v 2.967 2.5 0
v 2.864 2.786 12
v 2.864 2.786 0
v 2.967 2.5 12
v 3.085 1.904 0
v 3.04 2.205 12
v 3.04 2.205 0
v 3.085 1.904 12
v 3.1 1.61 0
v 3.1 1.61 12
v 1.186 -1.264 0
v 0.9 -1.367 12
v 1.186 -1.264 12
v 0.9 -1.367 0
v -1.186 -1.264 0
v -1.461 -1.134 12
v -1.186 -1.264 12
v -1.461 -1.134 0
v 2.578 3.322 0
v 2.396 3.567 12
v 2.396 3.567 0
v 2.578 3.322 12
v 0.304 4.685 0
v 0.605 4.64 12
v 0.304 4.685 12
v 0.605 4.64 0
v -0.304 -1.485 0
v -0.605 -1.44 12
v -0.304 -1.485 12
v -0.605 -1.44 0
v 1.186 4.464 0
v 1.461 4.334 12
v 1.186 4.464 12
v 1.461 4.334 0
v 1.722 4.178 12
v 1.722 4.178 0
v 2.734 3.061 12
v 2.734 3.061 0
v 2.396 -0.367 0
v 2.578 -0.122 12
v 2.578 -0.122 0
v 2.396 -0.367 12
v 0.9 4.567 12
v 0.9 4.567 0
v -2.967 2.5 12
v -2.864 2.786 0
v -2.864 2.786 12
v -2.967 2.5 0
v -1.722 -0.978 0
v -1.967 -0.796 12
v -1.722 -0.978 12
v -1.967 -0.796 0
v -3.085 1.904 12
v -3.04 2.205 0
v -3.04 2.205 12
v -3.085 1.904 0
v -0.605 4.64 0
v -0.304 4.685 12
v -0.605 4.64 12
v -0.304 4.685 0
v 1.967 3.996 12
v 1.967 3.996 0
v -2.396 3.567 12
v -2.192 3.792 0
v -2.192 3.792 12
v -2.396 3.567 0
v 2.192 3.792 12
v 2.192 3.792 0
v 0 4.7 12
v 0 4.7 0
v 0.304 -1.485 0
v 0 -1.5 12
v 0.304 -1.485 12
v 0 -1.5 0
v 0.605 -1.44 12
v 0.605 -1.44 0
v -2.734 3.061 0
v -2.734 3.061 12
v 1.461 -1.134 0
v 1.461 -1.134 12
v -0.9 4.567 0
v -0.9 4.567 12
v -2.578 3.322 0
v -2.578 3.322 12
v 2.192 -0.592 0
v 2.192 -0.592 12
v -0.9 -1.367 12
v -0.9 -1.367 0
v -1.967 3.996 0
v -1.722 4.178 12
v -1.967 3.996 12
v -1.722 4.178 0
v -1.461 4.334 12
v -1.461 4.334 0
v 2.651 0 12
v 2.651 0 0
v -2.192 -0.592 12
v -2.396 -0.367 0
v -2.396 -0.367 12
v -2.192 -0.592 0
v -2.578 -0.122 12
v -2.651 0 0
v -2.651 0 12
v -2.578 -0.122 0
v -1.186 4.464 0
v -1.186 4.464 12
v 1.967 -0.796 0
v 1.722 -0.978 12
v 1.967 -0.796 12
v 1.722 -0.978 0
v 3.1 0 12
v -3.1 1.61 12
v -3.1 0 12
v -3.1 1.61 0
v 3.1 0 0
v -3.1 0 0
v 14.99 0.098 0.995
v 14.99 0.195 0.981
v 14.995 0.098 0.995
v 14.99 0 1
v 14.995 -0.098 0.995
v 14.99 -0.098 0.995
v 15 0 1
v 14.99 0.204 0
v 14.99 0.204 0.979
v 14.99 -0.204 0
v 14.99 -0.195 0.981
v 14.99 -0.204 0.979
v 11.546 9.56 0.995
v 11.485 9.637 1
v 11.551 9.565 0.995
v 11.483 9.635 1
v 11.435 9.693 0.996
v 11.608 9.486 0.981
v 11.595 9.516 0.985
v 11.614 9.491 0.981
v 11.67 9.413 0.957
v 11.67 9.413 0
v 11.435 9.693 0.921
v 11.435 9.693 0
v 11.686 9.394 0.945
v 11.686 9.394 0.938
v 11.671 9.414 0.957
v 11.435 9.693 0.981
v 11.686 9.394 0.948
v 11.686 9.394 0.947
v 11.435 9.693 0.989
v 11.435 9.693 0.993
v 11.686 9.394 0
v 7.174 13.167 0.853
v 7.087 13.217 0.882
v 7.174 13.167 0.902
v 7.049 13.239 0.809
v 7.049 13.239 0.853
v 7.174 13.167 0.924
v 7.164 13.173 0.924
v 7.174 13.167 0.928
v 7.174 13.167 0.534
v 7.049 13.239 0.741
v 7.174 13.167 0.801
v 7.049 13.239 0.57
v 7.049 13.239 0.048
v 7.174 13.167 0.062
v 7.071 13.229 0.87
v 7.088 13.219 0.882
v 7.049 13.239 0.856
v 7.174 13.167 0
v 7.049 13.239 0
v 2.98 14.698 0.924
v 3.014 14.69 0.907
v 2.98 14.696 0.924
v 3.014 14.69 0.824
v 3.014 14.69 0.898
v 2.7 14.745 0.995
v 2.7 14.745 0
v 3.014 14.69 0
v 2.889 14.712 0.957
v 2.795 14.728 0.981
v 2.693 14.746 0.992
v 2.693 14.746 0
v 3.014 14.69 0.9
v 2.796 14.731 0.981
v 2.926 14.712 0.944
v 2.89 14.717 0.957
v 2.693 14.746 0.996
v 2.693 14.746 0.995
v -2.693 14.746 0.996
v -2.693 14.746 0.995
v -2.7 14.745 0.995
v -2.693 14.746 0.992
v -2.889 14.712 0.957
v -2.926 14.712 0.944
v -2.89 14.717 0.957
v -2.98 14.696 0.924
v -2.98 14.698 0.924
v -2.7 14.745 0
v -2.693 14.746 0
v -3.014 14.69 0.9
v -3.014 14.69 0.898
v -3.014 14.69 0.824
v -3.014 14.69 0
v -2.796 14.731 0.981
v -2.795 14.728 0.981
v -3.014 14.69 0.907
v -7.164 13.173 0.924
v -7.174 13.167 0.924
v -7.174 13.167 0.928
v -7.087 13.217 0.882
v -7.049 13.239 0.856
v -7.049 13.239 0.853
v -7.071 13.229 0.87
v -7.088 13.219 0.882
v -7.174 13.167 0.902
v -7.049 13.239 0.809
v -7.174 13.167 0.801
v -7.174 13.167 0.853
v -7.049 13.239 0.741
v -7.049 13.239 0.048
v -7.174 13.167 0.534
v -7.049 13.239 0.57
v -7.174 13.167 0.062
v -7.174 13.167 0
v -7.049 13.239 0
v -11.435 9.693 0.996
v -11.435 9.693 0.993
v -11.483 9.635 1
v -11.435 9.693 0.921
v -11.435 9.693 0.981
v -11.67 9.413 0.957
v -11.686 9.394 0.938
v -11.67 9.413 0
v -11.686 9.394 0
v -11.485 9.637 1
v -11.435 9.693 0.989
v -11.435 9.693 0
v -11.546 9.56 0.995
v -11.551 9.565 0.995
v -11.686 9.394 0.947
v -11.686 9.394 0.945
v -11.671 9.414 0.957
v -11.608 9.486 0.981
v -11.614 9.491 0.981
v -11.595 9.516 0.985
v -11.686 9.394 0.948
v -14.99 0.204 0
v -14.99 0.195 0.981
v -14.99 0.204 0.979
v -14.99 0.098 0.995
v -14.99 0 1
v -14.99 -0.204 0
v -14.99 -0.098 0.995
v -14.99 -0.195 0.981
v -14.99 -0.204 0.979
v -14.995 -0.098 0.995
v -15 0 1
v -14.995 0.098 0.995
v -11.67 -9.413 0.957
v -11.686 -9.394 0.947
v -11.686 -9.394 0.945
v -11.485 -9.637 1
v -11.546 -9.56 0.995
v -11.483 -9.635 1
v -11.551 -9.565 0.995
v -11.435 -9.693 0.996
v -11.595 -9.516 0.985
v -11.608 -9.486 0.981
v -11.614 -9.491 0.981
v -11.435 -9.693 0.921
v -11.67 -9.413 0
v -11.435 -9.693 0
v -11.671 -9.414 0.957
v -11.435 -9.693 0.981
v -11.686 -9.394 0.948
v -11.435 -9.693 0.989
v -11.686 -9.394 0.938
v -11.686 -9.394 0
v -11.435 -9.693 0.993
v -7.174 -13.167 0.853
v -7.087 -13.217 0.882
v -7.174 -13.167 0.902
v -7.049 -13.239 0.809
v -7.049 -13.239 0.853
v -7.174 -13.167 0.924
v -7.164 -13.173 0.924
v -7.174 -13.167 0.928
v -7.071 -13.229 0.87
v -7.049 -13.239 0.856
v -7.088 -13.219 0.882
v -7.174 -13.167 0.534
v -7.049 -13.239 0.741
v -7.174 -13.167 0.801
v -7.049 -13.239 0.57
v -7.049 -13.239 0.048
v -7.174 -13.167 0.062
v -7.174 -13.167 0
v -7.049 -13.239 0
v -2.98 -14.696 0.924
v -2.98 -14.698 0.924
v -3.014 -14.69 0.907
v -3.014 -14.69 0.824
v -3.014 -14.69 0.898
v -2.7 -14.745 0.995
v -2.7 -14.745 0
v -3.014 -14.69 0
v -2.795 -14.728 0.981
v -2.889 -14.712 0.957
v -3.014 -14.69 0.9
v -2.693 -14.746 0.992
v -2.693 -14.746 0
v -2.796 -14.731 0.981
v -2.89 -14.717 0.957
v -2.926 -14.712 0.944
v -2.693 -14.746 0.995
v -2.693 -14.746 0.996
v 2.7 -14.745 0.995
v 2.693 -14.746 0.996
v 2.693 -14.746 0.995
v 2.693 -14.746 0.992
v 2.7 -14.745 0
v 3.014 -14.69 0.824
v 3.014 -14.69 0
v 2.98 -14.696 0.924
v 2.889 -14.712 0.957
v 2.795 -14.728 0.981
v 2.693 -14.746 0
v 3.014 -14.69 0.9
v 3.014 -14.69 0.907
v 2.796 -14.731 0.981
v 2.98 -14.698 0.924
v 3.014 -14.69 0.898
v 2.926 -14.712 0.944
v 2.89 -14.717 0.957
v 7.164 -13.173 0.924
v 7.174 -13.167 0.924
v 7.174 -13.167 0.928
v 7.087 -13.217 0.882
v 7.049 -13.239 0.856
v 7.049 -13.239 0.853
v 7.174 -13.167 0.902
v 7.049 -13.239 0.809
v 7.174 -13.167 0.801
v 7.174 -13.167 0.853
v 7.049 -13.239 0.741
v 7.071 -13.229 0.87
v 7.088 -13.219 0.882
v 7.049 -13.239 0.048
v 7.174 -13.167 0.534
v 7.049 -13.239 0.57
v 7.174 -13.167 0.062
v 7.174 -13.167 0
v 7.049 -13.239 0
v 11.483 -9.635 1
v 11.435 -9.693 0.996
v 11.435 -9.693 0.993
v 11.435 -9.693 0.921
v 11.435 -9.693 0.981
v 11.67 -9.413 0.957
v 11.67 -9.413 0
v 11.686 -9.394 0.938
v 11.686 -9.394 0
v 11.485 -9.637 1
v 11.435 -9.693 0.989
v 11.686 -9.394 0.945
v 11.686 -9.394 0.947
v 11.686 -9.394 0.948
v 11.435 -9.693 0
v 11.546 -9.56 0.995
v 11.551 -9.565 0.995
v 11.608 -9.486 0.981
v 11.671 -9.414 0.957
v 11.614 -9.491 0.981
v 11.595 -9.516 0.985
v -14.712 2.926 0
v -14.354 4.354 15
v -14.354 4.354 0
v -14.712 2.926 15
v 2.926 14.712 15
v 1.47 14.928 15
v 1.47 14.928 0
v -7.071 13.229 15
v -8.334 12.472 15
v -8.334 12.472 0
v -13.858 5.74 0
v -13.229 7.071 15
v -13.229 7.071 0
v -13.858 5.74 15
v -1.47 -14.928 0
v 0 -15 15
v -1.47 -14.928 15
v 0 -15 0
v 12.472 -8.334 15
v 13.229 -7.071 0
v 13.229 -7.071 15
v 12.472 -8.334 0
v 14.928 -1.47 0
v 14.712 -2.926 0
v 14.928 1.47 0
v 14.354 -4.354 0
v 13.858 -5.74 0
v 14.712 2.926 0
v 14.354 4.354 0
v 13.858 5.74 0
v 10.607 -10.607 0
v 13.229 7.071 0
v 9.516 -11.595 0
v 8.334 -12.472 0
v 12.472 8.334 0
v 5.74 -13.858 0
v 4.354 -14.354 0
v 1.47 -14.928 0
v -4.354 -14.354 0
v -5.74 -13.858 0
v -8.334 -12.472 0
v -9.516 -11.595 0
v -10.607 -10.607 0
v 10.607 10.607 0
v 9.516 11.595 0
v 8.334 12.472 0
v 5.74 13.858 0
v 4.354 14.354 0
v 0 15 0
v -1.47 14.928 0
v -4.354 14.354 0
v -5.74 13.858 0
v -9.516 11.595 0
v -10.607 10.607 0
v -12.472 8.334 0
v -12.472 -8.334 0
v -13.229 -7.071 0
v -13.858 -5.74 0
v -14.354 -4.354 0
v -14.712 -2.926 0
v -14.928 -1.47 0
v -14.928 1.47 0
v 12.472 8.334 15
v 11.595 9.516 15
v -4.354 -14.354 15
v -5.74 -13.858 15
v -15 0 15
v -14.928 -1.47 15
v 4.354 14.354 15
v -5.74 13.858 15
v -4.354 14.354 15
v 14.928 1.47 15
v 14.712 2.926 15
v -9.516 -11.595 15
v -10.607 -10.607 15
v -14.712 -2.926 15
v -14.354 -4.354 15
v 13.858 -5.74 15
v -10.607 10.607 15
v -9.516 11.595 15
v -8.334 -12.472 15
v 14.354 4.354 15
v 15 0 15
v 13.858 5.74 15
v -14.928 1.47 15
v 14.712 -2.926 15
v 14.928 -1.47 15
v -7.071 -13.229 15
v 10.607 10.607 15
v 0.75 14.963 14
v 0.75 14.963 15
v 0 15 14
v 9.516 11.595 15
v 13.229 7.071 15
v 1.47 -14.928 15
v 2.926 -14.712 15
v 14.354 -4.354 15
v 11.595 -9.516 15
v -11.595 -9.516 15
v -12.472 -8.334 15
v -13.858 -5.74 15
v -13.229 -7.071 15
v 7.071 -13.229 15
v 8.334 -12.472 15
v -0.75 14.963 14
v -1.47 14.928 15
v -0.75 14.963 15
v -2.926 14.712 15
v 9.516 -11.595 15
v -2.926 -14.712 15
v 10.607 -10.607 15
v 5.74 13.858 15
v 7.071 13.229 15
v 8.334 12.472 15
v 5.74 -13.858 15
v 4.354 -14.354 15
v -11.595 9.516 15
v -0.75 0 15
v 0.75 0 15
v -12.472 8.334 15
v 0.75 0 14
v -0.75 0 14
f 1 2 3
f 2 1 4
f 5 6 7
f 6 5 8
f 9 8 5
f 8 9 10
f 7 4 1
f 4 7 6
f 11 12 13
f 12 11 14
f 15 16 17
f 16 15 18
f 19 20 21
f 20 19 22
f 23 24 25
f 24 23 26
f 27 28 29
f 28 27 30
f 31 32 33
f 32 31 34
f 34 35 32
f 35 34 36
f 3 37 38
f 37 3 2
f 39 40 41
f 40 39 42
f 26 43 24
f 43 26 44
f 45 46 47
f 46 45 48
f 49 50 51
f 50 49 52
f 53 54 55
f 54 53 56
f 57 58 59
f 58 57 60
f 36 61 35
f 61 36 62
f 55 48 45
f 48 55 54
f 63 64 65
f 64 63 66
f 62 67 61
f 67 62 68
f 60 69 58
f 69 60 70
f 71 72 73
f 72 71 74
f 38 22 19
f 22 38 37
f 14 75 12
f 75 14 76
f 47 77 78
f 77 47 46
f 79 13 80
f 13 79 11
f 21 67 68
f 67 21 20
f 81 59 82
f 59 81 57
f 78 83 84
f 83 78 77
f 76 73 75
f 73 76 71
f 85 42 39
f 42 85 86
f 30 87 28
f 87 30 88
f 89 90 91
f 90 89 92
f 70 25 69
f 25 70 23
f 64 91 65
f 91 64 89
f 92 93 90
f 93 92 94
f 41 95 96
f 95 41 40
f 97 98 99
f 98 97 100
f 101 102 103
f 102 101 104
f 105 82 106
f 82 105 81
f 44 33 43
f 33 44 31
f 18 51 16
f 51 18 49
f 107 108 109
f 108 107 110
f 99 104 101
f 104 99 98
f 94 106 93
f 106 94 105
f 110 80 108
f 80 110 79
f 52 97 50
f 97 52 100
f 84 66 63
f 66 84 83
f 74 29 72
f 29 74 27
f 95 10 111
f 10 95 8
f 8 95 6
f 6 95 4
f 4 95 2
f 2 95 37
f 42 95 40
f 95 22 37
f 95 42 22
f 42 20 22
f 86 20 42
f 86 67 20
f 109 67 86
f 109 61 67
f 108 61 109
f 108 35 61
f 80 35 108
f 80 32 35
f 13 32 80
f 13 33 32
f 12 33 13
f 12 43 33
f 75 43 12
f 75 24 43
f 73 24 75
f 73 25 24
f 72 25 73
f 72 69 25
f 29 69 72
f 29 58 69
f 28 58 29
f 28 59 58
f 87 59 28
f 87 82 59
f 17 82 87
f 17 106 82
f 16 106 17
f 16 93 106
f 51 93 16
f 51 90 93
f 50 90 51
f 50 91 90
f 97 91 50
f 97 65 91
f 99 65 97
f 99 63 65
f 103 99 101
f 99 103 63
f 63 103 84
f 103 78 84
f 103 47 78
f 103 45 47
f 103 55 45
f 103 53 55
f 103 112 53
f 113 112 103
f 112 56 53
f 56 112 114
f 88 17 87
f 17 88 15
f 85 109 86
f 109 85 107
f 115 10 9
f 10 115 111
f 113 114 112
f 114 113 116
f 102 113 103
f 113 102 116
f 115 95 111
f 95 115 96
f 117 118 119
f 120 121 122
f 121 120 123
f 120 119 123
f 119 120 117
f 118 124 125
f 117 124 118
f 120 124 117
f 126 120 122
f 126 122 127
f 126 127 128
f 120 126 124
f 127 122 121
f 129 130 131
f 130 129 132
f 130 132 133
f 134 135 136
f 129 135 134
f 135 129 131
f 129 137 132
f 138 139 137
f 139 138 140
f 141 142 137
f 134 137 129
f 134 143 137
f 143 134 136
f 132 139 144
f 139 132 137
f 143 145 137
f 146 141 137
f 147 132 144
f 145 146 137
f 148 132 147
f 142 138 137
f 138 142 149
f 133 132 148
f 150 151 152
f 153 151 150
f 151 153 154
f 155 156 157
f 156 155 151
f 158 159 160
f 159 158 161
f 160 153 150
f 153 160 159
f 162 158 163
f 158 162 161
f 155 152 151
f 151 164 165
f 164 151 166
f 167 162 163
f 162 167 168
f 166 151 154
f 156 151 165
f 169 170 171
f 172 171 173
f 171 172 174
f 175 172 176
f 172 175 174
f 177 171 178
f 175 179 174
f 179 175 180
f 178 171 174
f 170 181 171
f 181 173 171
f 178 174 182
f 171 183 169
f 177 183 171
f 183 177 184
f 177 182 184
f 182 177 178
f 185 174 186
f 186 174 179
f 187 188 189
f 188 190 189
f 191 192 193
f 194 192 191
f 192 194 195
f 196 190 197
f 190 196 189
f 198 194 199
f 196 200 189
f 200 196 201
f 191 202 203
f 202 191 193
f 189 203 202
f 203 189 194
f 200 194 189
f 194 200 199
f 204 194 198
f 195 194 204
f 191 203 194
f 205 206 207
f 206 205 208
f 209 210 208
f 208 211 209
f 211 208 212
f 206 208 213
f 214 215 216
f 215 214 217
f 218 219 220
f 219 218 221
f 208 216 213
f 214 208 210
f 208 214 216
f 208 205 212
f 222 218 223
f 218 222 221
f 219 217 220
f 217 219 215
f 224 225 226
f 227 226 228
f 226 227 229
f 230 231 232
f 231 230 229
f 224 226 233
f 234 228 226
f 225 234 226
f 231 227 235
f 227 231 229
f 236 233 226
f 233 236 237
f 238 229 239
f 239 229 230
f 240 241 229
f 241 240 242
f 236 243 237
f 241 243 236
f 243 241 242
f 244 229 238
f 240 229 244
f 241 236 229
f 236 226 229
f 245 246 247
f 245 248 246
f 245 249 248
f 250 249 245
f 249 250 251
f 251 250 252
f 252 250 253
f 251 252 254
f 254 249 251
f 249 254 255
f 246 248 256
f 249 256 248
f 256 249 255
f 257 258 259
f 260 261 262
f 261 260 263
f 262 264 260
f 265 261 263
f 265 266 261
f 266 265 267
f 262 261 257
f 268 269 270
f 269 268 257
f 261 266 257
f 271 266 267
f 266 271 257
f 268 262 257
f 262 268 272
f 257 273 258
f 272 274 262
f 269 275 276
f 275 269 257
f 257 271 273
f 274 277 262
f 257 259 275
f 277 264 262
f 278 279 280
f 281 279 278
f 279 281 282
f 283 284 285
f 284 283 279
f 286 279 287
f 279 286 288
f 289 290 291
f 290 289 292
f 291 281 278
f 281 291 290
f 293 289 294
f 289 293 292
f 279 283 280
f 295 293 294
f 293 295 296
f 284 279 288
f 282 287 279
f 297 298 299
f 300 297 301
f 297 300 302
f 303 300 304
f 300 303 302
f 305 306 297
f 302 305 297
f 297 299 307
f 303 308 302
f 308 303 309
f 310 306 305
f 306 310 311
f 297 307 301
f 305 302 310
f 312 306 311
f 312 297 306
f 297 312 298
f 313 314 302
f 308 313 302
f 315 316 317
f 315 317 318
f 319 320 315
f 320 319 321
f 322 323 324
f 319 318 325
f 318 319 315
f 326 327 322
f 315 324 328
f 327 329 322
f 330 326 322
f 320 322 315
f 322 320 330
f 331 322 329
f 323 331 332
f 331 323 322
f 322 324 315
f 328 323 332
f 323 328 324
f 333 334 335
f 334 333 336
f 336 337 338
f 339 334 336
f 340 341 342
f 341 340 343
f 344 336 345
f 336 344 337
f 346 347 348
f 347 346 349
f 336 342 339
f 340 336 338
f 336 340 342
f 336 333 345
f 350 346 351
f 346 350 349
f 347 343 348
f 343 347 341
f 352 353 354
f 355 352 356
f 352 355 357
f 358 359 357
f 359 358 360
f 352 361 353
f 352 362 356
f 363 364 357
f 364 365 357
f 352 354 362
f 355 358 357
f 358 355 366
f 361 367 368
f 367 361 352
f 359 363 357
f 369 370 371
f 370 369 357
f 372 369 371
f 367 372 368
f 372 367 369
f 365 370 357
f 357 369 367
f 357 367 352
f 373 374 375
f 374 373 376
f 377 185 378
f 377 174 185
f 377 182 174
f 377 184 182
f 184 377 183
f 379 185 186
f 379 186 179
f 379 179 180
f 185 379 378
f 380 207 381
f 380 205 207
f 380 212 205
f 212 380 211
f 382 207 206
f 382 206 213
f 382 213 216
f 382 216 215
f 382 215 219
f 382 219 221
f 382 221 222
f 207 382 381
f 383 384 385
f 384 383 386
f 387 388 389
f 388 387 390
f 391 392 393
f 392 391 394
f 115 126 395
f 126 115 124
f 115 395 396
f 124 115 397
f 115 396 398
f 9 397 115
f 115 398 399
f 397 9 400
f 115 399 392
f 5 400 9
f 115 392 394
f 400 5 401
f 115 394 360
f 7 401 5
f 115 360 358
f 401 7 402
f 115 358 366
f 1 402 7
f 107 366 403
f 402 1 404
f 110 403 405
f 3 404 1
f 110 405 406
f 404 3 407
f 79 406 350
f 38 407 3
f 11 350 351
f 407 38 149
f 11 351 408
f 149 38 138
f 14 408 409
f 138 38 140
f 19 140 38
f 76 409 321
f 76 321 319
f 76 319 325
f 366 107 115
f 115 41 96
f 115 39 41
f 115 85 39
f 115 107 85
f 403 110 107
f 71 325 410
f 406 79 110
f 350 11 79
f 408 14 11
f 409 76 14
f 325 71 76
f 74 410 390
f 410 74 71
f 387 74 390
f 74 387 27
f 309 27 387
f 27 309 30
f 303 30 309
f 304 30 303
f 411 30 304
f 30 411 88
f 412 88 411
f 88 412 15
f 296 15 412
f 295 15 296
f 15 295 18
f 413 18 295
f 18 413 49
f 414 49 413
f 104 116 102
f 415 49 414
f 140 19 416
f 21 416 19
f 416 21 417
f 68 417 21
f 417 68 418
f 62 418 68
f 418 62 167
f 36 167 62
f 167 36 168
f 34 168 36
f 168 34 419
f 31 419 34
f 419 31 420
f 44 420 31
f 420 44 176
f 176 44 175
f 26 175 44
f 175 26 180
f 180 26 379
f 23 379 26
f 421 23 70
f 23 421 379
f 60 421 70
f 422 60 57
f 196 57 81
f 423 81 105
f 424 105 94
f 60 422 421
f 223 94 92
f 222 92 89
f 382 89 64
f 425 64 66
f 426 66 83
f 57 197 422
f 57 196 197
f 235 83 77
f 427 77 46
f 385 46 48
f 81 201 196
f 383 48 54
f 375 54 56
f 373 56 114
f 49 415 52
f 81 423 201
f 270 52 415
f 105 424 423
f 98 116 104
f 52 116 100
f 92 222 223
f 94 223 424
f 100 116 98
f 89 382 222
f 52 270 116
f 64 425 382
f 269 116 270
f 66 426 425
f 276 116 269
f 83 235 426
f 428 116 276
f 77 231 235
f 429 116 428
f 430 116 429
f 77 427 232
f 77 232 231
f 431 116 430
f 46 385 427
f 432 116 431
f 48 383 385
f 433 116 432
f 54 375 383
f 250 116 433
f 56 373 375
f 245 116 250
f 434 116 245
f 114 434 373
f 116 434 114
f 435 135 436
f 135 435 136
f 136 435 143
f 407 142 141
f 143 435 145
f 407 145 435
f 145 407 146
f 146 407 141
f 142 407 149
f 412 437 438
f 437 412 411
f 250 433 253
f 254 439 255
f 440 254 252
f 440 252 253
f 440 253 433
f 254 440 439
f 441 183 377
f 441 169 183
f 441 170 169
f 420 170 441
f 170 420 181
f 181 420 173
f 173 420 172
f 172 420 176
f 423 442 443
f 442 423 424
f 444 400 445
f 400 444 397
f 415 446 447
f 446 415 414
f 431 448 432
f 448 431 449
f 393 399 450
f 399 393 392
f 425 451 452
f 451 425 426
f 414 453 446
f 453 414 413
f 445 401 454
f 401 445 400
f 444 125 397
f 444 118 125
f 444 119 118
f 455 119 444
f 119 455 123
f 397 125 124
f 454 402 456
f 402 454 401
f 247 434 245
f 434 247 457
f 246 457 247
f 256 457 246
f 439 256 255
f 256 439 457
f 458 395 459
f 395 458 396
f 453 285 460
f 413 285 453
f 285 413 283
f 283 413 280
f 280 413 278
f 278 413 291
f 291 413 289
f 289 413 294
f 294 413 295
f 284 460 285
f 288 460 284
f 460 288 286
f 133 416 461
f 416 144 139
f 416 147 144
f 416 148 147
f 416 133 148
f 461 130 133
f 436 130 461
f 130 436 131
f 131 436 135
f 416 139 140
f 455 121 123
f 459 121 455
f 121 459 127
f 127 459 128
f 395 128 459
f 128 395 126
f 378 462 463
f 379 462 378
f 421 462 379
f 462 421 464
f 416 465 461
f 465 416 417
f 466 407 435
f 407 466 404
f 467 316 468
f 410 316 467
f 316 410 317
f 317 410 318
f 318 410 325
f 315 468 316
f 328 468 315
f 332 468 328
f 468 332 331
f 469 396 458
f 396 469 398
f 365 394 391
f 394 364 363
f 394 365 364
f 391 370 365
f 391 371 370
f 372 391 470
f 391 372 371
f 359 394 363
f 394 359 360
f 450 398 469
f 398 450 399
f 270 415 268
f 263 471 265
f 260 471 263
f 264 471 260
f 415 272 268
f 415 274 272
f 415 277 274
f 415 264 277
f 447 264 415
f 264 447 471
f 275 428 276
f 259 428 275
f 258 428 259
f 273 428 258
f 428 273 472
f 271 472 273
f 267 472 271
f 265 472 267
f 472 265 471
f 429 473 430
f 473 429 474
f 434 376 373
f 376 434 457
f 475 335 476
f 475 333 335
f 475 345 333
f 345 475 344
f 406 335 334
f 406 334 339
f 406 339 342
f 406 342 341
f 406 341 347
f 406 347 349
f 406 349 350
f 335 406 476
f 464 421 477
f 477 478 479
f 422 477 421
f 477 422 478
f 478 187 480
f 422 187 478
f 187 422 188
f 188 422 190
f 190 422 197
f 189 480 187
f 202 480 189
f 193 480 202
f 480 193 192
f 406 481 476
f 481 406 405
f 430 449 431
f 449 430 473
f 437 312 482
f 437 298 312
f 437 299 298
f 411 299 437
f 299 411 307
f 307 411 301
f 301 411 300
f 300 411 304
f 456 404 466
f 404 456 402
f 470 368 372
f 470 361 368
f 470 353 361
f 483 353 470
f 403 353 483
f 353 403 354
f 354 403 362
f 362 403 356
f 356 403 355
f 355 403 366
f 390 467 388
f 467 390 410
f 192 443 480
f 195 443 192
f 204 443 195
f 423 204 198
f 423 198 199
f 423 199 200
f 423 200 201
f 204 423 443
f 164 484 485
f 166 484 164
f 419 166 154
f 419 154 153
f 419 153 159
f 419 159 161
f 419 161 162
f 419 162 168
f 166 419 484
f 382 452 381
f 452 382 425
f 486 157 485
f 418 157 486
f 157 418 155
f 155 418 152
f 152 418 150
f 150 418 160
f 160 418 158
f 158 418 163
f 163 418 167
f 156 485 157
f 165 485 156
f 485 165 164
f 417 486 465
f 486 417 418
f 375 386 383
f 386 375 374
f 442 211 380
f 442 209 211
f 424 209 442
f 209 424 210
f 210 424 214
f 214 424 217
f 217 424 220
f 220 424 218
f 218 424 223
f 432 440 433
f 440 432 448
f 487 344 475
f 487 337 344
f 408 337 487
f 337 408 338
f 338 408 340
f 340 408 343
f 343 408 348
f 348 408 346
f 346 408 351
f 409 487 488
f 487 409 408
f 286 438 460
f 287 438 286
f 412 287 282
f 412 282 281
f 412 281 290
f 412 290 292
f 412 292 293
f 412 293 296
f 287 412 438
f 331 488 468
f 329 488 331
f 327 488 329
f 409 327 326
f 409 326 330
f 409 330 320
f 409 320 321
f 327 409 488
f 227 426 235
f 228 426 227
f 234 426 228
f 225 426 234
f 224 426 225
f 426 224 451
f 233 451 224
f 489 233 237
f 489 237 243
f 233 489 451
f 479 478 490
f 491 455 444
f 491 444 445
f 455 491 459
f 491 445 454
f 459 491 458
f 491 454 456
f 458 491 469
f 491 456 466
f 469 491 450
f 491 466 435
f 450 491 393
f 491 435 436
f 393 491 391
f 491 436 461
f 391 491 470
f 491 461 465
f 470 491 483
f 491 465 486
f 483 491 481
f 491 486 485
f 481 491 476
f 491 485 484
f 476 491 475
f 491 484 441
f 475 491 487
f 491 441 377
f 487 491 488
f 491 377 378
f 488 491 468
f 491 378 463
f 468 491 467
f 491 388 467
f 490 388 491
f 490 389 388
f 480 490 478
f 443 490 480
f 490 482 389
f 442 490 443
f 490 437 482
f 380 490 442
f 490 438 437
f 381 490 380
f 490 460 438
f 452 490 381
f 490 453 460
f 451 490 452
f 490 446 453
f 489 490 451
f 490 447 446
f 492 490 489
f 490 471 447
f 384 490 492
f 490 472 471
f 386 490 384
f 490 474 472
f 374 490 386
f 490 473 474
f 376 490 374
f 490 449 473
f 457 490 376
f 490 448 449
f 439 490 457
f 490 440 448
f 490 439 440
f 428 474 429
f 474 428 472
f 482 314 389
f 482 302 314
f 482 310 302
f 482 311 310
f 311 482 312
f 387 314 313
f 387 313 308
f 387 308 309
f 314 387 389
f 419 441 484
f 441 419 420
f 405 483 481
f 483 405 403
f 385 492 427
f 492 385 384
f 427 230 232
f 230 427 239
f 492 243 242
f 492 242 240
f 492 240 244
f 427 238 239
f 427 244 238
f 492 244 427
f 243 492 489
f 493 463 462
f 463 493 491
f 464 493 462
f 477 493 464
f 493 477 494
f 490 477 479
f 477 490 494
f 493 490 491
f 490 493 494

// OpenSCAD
// Replacement knob for a 6 mm D-shaft hotplate stirrer
// Print orientation: hotplate-facing side down on the bed (z = 0), builds upward (+Z)

$fn = 64;

// ---- Dimensions (mm) ----
knob_dia      = 30;   // outer cylinder diameter
knob_h        = 15;   // knob height (z = 0 .. 15)
knob_r        = knob_dia / 2;

// D-bore (blind, from bottom face)
bore_dia      = 6.2;  // circle part of the D
bore_flat     = 4.7;  // distance from flat to opposite side of circle
bore_h        = 12;   // depth of the blind bore
bore_r        = bore_dia / 2;
bore_c        = bore_flat - bore_r;  // circle centre offset from knob centre (flat side)

// Grip grooves (vertical, full height)
n_grooves     = 18;
groove_dia    = 2;
groove_r      = groove_dia / 2;

// Pointer groove (top face)
ptr_w         = 1.5;  // width
ptr_d         = 1;    // depth
ptr_len       = knob_r + 1;  // extend past outer edge for a clean cut

// ---- Body ----
module body() { cylinder(h = knob_h, r = knob_r, $fn = $fn); }

// ---- D-shaped blind bore (cut from bottom, z = 0 .. bore_h) ----
// Circle part of the D, offset toward the flat side
module d_circle() { translate([0, bore_c, -0.01])
    cylinder(h = bore_h + 0.01, r = bore_r, $fn = $fn); }

// Flat part of the D: a box that removes everything beyond the flat plane
// (flat plane is at y = 0; circle centre is at y = bore_c)
module d_flat() { translate([-bore_r, 0, -0.01])
    cube([2 * bore_r, bore_c + 0.01, bore_h + 0.01]); }

module d_bore() { union() {
    d_circle();
    d_flat();
} }

// ---- Vertical grip grooves (18, evenly spaced, full height) ----
// Each groove is a 2 mm diameter half-cylinder centred on the outer surface.
// The half-cylinder is oriented so its flat face is radial (pointing at the knob
// centre) and its curved face bites into the outer surface.
module groove() { rotate([0, 90, 0])
    translate([0, 0, -0.01])
    cylinder(h = knob_h + 0.02, r = groove_r, $fn = $fn); }

module grips() { for (i = [0 : n_grooves - 1])
    rotate([0, 0, i * 360 / n_grooves])
        translate([knob_r, 0, 0])
            groove(); }

// ---- Pointer groove (top face, from centre to outer edge, on the flat side) ----
// Flat side is +Y, so the pointer runs along +Y.
// A 1.5 mm wide, 1 mm deep slot cut into the top face.
module pointer() { translate([-ptr_w / 2, 0, knob_h - ptr_d])
    cube([ptr_w, ptr_len, ptr_d + 0.01]); }

// ---- Final part ----
difference() {
    body();
    d_bore();
    grips();
    pointer();
}
